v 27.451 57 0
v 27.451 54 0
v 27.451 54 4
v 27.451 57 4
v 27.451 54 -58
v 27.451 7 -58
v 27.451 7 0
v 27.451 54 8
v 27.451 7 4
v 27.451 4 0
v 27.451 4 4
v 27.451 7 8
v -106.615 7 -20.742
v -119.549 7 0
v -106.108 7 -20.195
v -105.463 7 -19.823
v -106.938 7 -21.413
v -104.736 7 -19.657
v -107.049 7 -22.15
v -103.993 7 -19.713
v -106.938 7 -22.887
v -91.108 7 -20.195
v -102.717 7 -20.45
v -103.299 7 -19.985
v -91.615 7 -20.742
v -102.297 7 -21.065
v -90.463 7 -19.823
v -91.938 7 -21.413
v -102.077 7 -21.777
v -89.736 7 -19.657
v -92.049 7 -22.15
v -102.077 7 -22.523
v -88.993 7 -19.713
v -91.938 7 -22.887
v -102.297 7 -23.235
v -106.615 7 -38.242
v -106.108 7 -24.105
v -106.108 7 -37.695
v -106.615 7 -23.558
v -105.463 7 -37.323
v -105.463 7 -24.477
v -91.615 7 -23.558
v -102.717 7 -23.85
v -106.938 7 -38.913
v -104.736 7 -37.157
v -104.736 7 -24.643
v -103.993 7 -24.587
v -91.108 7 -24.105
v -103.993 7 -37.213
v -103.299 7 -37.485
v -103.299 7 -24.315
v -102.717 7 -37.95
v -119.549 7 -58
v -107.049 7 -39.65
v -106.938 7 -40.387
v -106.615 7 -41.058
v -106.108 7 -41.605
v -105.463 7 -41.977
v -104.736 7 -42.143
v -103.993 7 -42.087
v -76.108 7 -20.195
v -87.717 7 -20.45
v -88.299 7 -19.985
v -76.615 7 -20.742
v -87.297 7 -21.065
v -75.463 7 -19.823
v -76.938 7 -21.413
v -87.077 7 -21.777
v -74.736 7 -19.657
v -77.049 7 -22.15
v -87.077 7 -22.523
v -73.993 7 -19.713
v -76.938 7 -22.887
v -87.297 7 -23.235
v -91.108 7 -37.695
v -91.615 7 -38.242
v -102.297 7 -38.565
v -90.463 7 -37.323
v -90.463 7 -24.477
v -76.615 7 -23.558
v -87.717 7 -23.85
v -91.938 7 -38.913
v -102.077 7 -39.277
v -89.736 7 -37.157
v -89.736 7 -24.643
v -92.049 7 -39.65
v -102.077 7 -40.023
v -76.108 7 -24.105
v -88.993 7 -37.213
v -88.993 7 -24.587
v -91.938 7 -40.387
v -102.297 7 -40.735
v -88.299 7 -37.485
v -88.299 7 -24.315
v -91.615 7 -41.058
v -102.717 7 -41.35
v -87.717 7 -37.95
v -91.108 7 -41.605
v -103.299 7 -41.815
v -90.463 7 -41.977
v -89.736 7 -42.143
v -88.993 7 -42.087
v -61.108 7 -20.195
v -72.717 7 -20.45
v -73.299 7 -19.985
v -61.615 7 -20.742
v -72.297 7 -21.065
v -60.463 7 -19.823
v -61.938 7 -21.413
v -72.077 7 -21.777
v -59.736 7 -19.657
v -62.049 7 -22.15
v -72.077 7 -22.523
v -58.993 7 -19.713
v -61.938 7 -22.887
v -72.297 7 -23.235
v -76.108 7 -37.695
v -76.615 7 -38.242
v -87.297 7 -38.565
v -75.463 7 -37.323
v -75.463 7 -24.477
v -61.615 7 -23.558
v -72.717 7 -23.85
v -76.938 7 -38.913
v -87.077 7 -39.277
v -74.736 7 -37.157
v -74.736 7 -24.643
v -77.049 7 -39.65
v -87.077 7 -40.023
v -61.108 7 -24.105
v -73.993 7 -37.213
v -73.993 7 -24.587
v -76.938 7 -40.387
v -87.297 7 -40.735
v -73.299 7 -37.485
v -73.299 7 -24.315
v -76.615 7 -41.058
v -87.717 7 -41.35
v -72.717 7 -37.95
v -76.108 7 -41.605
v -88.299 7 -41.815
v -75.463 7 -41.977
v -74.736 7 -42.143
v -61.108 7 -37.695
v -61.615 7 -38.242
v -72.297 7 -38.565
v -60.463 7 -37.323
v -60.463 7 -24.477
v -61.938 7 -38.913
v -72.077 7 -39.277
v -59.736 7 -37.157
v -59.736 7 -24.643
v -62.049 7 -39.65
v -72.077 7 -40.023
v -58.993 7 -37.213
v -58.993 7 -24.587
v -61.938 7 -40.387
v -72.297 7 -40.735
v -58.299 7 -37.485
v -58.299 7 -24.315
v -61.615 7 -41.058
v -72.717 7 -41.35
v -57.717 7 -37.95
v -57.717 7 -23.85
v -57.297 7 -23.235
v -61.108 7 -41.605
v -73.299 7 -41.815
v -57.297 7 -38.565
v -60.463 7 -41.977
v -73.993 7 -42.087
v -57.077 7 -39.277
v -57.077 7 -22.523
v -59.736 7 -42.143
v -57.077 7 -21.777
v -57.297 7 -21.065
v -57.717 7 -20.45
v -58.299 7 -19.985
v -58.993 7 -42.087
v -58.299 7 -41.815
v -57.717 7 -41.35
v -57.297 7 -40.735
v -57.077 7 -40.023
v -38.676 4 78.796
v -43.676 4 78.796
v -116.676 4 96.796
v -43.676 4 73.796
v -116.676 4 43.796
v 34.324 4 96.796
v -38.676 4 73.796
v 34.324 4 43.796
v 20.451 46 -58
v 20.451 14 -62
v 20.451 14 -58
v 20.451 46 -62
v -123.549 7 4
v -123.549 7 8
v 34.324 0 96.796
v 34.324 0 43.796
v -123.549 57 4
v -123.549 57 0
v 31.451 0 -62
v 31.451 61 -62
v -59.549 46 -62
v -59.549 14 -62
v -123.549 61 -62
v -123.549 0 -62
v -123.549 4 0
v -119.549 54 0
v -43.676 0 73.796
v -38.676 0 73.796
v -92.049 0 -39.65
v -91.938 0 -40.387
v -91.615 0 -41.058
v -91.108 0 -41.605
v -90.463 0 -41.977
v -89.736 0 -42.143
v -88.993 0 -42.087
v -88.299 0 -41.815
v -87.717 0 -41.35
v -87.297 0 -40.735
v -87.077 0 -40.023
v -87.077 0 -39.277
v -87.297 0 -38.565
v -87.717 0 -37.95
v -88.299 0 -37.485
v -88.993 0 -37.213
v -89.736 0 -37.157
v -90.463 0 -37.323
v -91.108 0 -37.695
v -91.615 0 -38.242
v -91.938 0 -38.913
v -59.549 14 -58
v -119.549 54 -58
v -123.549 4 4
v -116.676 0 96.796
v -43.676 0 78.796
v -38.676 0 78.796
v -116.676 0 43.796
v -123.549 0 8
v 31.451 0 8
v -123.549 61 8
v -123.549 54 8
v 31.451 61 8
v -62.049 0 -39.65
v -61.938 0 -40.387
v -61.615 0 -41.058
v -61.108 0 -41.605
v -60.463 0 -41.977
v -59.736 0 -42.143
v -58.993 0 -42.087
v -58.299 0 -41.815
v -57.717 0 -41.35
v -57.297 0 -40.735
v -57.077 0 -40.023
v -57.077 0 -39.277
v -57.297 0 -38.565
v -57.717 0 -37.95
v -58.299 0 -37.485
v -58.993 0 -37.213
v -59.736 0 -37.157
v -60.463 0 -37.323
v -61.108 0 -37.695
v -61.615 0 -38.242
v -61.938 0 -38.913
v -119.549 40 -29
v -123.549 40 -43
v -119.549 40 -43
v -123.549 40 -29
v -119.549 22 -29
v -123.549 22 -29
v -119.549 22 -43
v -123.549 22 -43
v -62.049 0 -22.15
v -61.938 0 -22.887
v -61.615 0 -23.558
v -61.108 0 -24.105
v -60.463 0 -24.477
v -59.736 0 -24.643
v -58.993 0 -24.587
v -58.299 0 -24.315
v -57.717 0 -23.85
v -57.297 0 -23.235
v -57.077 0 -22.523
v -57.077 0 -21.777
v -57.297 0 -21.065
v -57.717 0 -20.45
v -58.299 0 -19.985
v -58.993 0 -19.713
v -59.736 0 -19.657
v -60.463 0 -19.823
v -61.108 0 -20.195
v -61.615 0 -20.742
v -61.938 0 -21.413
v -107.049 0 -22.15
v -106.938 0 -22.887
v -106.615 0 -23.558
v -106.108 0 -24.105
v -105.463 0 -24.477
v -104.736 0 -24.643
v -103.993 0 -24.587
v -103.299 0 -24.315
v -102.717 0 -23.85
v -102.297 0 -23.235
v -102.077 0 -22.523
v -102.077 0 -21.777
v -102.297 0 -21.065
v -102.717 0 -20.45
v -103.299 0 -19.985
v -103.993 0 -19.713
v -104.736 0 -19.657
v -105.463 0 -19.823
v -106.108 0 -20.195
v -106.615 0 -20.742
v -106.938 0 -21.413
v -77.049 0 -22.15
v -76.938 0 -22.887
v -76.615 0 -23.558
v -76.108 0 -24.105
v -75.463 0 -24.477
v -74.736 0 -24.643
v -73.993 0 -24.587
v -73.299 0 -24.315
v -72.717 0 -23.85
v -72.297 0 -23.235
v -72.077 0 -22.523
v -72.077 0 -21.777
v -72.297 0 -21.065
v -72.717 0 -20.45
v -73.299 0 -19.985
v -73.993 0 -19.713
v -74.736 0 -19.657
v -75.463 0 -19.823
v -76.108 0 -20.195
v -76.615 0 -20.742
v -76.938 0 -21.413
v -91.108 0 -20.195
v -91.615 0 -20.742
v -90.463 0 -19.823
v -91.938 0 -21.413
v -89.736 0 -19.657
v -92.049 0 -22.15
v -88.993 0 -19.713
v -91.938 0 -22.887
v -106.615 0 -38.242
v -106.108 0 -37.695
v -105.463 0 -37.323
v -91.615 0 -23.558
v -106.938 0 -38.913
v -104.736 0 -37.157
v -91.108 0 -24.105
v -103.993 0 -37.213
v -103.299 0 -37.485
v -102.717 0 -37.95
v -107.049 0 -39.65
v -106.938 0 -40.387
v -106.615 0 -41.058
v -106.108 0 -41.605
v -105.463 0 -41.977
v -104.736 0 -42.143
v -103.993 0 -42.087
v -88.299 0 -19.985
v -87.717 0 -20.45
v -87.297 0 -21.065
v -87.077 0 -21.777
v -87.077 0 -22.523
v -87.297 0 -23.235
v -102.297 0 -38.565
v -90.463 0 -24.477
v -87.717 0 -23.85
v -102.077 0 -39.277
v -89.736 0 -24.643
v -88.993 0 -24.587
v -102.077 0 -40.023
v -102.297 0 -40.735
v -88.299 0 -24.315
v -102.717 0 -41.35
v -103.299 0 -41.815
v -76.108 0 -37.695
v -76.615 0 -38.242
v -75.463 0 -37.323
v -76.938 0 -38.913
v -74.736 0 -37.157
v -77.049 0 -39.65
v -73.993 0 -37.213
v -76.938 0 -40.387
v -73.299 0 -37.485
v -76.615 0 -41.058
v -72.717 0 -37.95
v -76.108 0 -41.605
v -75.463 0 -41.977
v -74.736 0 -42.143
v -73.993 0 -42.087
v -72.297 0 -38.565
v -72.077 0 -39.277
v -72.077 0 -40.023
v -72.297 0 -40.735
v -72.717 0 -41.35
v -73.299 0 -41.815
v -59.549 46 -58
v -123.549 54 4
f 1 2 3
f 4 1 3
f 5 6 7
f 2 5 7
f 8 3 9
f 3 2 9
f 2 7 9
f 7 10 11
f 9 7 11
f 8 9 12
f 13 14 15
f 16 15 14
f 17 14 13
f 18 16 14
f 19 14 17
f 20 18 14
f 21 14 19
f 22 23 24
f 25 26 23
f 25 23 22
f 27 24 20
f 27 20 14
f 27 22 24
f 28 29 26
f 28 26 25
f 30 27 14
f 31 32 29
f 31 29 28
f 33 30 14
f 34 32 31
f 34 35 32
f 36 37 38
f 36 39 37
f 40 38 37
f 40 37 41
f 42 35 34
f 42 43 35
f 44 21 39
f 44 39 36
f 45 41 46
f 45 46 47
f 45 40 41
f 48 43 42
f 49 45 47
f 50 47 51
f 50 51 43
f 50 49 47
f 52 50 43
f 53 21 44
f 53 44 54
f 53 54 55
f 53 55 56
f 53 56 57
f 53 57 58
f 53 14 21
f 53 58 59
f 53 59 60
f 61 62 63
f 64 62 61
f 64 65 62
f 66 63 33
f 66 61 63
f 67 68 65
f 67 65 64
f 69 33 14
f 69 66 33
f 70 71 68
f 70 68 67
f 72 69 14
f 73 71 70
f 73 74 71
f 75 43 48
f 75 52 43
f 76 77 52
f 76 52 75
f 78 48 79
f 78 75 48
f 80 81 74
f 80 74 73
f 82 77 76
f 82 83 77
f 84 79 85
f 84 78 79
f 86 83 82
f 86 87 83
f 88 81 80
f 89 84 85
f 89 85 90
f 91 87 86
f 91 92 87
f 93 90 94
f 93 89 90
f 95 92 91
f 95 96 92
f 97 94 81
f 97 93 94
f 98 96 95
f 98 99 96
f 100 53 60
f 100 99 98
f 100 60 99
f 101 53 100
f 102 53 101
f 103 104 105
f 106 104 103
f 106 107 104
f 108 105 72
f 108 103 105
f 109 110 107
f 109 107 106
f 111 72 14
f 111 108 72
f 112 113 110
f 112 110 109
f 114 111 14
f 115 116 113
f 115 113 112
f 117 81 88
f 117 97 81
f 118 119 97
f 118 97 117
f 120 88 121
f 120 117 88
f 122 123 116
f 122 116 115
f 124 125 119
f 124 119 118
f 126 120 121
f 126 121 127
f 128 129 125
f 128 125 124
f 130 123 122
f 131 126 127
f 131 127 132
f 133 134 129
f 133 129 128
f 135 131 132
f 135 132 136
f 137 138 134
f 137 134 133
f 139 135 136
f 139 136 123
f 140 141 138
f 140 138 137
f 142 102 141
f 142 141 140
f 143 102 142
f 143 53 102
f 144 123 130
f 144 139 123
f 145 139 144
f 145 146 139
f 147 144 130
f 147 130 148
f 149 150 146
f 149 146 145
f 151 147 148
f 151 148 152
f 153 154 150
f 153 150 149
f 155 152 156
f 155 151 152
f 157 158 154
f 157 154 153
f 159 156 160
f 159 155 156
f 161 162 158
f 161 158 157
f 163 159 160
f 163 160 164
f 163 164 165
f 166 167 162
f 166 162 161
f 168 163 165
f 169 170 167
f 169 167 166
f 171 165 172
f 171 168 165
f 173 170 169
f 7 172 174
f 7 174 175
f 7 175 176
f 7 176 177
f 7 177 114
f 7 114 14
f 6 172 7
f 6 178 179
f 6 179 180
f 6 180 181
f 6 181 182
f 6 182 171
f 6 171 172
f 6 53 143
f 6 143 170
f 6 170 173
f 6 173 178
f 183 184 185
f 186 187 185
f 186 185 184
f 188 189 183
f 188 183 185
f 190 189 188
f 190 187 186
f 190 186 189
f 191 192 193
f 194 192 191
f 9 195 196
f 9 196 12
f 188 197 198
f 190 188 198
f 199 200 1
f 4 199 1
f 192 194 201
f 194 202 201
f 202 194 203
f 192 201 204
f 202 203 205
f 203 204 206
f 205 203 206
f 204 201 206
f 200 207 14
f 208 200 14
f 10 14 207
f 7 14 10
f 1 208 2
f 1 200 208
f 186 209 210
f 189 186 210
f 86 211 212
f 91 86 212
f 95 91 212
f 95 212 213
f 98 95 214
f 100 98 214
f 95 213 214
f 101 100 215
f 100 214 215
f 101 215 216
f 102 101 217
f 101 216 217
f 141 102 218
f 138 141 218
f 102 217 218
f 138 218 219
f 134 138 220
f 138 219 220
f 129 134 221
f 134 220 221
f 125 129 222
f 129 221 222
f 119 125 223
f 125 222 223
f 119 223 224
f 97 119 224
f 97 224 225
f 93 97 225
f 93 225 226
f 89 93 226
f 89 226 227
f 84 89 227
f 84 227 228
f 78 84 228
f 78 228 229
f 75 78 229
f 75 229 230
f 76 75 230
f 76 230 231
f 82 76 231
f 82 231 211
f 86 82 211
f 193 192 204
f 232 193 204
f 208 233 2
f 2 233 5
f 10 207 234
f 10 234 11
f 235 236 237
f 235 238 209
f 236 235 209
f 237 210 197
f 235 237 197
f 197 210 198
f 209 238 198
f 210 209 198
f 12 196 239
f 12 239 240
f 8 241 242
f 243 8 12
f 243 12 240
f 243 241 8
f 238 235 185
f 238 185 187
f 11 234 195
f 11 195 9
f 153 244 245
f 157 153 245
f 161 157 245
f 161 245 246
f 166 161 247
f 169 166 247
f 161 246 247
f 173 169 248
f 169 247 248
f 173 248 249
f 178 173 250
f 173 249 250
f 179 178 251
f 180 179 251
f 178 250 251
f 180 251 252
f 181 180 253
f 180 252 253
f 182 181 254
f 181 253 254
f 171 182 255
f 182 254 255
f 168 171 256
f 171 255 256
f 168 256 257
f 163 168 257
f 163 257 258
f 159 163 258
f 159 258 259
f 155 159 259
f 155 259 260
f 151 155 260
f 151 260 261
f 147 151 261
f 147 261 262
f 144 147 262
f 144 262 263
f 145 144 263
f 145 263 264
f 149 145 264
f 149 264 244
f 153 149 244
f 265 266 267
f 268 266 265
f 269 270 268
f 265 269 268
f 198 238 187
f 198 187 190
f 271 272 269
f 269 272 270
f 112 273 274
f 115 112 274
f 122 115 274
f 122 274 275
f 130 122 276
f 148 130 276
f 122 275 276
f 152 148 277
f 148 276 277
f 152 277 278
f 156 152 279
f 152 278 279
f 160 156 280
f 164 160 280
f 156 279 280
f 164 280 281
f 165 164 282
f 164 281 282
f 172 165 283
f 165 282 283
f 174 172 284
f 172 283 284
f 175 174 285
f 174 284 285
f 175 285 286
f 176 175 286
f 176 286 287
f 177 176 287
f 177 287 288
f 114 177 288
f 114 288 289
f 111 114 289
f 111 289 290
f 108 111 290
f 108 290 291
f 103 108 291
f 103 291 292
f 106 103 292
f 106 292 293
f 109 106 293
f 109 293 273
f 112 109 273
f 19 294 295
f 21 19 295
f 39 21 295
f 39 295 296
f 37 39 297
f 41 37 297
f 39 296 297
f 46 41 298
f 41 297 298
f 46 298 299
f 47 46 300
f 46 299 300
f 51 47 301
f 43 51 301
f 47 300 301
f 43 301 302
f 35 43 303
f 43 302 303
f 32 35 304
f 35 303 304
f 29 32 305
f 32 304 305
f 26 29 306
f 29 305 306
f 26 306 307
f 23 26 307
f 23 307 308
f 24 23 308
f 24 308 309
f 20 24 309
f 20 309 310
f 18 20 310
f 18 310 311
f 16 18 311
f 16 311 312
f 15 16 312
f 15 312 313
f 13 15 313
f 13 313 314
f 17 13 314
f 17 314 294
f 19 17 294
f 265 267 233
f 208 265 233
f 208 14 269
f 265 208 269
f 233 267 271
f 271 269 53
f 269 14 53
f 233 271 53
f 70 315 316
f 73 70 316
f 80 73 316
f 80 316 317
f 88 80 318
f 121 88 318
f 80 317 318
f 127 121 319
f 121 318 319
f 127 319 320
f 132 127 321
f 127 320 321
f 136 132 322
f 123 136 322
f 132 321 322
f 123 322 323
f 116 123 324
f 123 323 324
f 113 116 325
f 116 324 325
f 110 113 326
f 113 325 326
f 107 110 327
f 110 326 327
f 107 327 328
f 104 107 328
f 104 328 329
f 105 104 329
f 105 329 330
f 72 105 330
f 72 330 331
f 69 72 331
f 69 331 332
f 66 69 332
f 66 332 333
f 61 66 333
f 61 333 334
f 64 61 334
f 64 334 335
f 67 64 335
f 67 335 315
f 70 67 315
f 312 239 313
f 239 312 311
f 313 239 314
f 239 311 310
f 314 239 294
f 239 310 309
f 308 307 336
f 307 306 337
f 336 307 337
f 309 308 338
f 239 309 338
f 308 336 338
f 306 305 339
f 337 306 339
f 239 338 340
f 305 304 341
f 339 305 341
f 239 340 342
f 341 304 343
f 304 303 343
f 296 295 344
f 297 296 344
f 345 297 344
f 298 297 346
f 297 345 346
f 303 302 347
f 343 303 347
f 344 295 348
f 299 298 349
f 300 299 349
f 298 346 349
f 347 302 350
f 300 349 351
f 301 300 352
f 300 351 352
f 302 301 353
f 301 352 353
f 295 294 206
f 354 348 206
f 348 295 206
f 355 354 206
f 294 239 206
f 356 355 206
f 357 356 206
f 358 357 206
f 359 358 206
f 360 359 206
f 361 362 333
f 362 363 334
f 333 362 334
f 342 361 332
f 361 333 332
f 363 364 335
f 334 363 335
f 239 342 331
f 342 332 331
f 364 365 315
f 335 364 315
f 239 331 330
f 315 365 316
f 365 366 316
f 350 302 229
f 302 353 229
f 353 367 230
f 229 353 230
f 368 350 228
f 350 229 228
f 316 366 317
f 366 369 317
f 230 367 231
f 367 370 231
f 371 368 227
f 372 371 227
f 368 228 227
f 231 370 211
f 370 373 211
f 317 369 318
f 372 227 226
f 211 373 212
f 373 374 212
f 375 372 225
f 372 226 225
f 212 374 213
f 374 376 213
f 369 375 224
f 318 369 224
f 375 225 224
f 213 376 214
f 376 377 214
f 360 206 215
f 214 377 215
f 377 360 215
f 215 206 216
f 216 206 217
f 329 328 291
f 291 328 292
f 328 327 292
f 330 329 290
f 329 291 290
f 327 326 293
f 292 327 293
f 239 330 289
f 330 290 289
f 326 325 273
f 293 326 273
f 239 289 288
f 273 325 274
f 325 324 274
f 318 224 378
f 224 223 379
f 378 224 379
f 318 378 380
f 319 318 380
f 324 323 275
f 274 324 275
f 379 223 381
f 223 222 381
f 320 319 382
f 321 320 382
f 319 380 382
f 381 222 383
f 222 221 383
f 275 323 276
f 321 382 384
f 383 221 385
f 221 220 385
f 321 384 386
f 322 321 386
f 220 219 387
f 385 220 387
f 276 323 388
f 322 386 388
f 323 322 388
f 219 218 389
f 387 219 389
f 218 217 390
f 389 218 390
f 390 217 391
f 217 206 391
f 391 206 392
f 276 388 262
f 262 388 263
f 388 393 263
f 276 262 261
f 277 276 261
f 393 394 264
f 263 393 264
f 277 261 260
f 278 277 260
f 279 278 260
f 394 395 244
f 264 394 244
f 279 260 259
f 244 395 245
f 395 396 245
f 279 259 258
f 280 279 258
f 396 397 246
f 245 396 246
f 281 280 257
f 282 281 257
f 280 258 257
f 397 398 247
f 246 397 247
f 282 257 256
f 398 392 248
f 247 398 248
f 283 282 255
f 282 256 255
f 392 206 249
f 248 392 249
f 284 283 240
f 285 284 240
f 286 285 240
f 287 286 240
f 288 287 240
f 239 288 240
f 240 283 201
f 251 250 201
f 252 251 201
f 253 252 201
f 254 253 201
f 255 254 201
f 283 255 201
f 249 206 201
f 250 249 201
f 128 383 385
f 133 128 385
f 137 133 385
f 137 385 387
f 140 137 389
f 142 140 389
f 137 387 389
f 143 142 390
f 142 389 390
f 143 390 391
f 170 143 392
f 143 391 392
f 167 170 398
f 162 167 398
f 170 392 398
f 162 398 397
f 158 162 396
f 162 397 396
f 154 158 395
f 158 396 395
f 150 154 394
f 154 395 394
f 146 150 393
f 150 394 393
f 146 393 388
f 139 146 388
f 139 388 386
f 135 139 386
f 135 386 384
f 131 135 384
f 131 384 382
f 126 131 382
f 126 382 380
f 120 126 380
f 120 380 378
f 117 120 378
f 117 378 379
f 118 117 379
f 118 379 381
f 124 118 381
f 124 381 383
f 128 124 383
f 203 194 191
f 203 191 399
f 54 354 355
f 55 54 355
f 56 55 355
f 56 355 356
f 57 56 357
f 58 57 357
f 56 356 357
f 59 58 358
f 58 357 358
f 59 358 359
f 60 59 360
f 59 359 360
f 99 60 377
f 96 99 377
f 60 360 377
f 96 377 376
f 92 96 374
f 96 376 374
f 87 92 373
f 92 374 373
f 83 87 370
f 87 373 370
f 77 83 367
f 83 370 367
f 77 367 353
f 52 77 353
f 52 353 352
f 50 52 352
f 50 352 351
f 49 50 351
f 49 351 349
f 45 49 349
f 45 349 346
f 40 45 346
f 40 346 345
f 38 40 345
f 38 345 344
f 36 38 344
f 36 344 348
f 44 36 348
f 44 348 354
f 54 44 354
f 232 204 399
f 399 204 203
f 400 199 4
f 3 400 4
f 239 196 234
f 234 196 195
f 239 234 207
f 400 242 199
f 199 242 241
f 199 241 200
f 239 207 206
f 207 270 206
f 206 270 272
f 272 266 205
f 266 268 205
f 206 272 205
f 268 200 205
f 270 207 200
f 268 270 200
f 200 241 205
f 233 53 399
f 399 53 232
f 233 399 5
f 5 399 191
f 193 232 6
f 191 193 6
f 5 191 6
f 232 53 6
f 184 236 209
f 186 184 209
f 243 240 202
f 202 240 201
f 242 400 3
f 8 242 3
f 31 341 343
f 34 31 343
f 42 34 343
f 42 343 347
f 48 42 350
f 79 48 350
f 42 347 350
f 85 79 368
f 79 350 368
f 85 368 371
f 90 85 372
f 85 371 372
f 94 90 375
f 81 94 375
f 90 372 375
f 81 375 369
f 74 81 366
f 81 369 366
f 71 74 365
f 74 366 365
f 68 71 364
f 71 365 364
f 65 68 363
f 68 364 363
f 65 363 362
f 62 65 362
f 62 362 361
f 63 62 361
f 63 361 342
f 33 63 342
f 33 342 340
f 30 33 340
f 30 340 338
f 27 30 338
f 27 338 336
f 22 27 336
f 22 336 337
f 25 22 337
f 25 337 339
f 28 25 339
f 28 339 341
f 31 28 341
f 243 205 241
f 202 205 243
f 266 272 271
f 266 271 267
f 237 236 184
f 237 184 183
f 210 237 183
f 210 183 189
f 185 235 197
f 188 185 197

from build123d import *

# Parameters (mm, degrees)
SCHIZZO1_W                    = 147
SCHIZZO1_H                    = 58
SCHIZZO1_W_2                  = 151
SCHIZZO1_H_2                  = 4
ESTRUSIONE_ESTRUSIONE7_DEPTH  = 4
SCHIZZO8_W                    = 147
SCHIZZO8_H                    = 58
SCHIZZO8_W_2                  = 151
SCHIZZO8_H_2                  = 4
ESTRUSIONE_ESTRUSIONE9_DEPTH  = 3
ESTRUSIONE_ESTRUSIONE10_DEPTH = 54
SCHIZZO18_W                   = 147
SCHIZZO18_H                   = 58
ESTRUSIONE_ESTRUSIONE11_DEPTH = 7
SCHIZZO19_W                   = 151
SCHIZZO19_H                   = 4
ESTRUSIONE_ESTRUSIONE12_DEPTH = 4
SCHIZZO20_W                   = 151
SCHIZZO20_H                   = 4
ESTRUSIONE_ESTRUSIONE13_DEPTH = 7
SCHIZZO21_W                   = 14
SCHIZZO21_H                   = 18
TAGLIO_ESTRUSIONE1_DEPTH      = 7
SCHIZZO22_W                   = 80
SCHIZZO22_H                   = 32
TAGLIO_ESTRUSIONE2_DEPTH      = 7
SCHIZZO23_R                   = 2.5
TAGLIO_ESTRUSIONE3_DEPTH      = 10
SCHIZZO29_W                   = 151
SCHIZZO29_H                   = 53
SCHIZZO29_W_2                 = 5
SCHIZZO29_H_2                 = 5
ESTRUSIONE_ESTRUSIONE14_DEPTH = 4


with BuildPart() as part:
    # Schizzo1 → Estrusione-Estrusione7 (new body)
    with BuildSketch(Plane(origin=(0, 0, 0), x_dir=(1, 0, 0), z_dir=(0, 1, 0))):
        Polygon((-119.549168975, 0), (-119.549168975, 58), (27.450831025, 58), (27.450831025, 0), (27.450831025, -4), (27.450831025, -8), (31.450831025, -8), (31.450831025, 62), (-123.549168975, 62), (-123.549168975, 0), align=None)
        with Locations((-46.049168975, 29)):
            Rectangle(SCHIZZO1_W, SCHIZZO1_H)
        Polygon((27.450831025, 0), (-119.549168975, 0), (-123.549168975, 0), (-123.549168975, -4), (27.450831025, -4), align=None)
        with Locations((-48.049168975, -6)):
            Rectangle(SCHIZZO1_W_2, SCHIZZO1_H_2)
    extrude(amount=ESTRUSIONE_ESTRUSIONE7_DEPTH)

    # Schizzo8 → Estrusione-Estrusione9 (add)
    with BuildSketch(Plane(origin=(0, 4, 0), x_dir=(1, 0, 0), z_dir=(0, 1, 0))):
        Polygon((-119.549168975, 0), (-119.549168975, 58), (27.450831025, 58), (27.450831025, 0), (27.450831025, -4), (27.450831025, -8), (31.450831025, -8), (31.450831025, 62), (-123.549168975, 62), (-123.549168975, 0), align=None)
        with Locations((-46.049168975, 29)):
            Rectangle(SCHIZZO8_W, SCHIZZO8_H)
        with Locations((-48.049168975, -6)):
            Rectangle(SCHIZZO8_W_2, SCHIZZO8_H_2)
    extrude(amount=ESTRUSIONE_ESTRUSIONE9_DEPTH)

    # Schizzo15 → Estrusione-Estrusione10 (add)
    with BuildSketch(Plane(origin=(0, 7, 0), x_dir=(1, 0, 0), z_dir=(0, 1, 0))):
        Polygon((31.450831025, -8), (31.450831025, 62), (-123.549168975, 62), (-123.549168975, 0), (-119.549168975, 0), (-119.549168975, 58), (27.450831025, 58), (27.450831025, 0), (27.450831025, -4), (27.450831025, -8), align=None)
    extrude(amount=ESTRUSIONE_ESTRUSIONE10_DEPTH)

    # Schizzo18 → Estrusione-Estrusione11 (add)
    with BuildSketch(Plane(origin=(0, 61, 0), x_dir=(1, 0, 0), z_dir=(0, 1, 0))):
        with Locations((-46.049168975, 29)):
            Rectangle(SCHIZZO18_W, SCHIZZO18_H)
    extrude(amount=-ESTRUSIONE_ESTRUSIONE11_DEPTH)

    # Schizzo19 → Estrusione-Estrusione12 (add)
    with BuildSketch(Plane(origin=(0, 61, 0), x_dir=(1, 0, 0), z_dir=(0, 1, 0))):
        with Locations((-48.049168975, -2)):
            Rectangle(SCHIZZO19_W, SCHIZZO19_H)
    extrude(amount=-ESTRUSIONE_ESTRUSIONE12_DEPTH)

    # Schizzo20 → Estrusione-Estrusione13 (add)
    with BuildSketch(Plane(origin=(0, 61, 0), x_dir=(1, 0, 0), z_dir=(0, 1, 0))):
        with Locations((-48.049168975, -6)):
            Rectangle(SCHIZZO20_W, SCHIZZO20_H)
    extrude(amount=-ESTRUSIONE_ESTRUSIONE13_DEPTH)

    # Schizzo21 → Taglio-Estrusione1 (cut)
    with BuildSketch(Plane.ZY.offset(123.549168975)):
        with Locations((-36, 31)):
            Rectangle(SCHIZZO21_W, SCHIZZO21_H)
    extrude(amount=-TAGLIO_ESTRUSIONE1_DEPTH, mode=Mode.SUBTRACT)

    # Schizzo22 → Taglio-Estrusione2 (cut)
    with BuildSketch(Plane(origin=(0, 0, -62), x_dir=(-1, 0, 0), z_dir=(0, 0, -1))):
        with Locations((19.549168975, 30)):
            Rectangle(SCHIZZO22_W, SCHIZZO22_H)
    extrude(amount=-TAGLIO_ESTRUSIONE2_DEPTH, mode=Mode.SUBTRACT)

    # Schizzo23 → Taglio-Estrusione3 (cut)
    with BuildSketch(Plane(origin=(0, 0, 0), x_dir=(-1, 0, 0), z_dir=(0, -1, 0))):
        with Locations((104.549168975, 39.65)):
            Circle(SCHIZZO23_R)
        with Locations((104.549168975, 22.15)):
            Circle(SCHIZZO23_R)
        with Locations((89.549168975, 39.65)):
            Circle(SCHIZZO23_R)
        with Locations((89.549168975, 22.15)):
            Circle(SCHIZZO23_R)
        with Locations((74.549168975, 39.65)):
            Circle(SCHIZZO23_R)
        with Locations((74.549168975, 22.15)):
            Circle(SCHIZZO23_R)
        with Locations((59.549168975, 39.65)):
            Circle(SCHIZZO23_R)
        with Locations((59.549168975, 22.15)):
            Circle(SCHIZZO23_R)
    extrude(amount=-TAGLIO_ESTRUSIONE3_DEPTH, mode=Mode.SUBTRACT)


with BuildPart() as body_2:
    # Schizzo29 → Estrusione-Estrusione14 (new body)
    with BuildSketch(Plane(origin=(0, 0, 0), x_dir=(1, 0, 0), z_dir=(0, 1, 0))):
        with Locations((-41.175555787, -70.295845643)):
            Rectangle(SCHIZZO29_W, SCHIZZO29_H)
        with Locations((-41.175555787, -76.295845643)):
            Rectangle(SCHIZZO29_W_2, SCHIZZO29_H_2, mode=Mode.SUBTRACT)
    extrude(amount=ESTRUSIONE_ESTRUSIONE14_DEPTH)


solid = Compound([part.part, body_2.part])
